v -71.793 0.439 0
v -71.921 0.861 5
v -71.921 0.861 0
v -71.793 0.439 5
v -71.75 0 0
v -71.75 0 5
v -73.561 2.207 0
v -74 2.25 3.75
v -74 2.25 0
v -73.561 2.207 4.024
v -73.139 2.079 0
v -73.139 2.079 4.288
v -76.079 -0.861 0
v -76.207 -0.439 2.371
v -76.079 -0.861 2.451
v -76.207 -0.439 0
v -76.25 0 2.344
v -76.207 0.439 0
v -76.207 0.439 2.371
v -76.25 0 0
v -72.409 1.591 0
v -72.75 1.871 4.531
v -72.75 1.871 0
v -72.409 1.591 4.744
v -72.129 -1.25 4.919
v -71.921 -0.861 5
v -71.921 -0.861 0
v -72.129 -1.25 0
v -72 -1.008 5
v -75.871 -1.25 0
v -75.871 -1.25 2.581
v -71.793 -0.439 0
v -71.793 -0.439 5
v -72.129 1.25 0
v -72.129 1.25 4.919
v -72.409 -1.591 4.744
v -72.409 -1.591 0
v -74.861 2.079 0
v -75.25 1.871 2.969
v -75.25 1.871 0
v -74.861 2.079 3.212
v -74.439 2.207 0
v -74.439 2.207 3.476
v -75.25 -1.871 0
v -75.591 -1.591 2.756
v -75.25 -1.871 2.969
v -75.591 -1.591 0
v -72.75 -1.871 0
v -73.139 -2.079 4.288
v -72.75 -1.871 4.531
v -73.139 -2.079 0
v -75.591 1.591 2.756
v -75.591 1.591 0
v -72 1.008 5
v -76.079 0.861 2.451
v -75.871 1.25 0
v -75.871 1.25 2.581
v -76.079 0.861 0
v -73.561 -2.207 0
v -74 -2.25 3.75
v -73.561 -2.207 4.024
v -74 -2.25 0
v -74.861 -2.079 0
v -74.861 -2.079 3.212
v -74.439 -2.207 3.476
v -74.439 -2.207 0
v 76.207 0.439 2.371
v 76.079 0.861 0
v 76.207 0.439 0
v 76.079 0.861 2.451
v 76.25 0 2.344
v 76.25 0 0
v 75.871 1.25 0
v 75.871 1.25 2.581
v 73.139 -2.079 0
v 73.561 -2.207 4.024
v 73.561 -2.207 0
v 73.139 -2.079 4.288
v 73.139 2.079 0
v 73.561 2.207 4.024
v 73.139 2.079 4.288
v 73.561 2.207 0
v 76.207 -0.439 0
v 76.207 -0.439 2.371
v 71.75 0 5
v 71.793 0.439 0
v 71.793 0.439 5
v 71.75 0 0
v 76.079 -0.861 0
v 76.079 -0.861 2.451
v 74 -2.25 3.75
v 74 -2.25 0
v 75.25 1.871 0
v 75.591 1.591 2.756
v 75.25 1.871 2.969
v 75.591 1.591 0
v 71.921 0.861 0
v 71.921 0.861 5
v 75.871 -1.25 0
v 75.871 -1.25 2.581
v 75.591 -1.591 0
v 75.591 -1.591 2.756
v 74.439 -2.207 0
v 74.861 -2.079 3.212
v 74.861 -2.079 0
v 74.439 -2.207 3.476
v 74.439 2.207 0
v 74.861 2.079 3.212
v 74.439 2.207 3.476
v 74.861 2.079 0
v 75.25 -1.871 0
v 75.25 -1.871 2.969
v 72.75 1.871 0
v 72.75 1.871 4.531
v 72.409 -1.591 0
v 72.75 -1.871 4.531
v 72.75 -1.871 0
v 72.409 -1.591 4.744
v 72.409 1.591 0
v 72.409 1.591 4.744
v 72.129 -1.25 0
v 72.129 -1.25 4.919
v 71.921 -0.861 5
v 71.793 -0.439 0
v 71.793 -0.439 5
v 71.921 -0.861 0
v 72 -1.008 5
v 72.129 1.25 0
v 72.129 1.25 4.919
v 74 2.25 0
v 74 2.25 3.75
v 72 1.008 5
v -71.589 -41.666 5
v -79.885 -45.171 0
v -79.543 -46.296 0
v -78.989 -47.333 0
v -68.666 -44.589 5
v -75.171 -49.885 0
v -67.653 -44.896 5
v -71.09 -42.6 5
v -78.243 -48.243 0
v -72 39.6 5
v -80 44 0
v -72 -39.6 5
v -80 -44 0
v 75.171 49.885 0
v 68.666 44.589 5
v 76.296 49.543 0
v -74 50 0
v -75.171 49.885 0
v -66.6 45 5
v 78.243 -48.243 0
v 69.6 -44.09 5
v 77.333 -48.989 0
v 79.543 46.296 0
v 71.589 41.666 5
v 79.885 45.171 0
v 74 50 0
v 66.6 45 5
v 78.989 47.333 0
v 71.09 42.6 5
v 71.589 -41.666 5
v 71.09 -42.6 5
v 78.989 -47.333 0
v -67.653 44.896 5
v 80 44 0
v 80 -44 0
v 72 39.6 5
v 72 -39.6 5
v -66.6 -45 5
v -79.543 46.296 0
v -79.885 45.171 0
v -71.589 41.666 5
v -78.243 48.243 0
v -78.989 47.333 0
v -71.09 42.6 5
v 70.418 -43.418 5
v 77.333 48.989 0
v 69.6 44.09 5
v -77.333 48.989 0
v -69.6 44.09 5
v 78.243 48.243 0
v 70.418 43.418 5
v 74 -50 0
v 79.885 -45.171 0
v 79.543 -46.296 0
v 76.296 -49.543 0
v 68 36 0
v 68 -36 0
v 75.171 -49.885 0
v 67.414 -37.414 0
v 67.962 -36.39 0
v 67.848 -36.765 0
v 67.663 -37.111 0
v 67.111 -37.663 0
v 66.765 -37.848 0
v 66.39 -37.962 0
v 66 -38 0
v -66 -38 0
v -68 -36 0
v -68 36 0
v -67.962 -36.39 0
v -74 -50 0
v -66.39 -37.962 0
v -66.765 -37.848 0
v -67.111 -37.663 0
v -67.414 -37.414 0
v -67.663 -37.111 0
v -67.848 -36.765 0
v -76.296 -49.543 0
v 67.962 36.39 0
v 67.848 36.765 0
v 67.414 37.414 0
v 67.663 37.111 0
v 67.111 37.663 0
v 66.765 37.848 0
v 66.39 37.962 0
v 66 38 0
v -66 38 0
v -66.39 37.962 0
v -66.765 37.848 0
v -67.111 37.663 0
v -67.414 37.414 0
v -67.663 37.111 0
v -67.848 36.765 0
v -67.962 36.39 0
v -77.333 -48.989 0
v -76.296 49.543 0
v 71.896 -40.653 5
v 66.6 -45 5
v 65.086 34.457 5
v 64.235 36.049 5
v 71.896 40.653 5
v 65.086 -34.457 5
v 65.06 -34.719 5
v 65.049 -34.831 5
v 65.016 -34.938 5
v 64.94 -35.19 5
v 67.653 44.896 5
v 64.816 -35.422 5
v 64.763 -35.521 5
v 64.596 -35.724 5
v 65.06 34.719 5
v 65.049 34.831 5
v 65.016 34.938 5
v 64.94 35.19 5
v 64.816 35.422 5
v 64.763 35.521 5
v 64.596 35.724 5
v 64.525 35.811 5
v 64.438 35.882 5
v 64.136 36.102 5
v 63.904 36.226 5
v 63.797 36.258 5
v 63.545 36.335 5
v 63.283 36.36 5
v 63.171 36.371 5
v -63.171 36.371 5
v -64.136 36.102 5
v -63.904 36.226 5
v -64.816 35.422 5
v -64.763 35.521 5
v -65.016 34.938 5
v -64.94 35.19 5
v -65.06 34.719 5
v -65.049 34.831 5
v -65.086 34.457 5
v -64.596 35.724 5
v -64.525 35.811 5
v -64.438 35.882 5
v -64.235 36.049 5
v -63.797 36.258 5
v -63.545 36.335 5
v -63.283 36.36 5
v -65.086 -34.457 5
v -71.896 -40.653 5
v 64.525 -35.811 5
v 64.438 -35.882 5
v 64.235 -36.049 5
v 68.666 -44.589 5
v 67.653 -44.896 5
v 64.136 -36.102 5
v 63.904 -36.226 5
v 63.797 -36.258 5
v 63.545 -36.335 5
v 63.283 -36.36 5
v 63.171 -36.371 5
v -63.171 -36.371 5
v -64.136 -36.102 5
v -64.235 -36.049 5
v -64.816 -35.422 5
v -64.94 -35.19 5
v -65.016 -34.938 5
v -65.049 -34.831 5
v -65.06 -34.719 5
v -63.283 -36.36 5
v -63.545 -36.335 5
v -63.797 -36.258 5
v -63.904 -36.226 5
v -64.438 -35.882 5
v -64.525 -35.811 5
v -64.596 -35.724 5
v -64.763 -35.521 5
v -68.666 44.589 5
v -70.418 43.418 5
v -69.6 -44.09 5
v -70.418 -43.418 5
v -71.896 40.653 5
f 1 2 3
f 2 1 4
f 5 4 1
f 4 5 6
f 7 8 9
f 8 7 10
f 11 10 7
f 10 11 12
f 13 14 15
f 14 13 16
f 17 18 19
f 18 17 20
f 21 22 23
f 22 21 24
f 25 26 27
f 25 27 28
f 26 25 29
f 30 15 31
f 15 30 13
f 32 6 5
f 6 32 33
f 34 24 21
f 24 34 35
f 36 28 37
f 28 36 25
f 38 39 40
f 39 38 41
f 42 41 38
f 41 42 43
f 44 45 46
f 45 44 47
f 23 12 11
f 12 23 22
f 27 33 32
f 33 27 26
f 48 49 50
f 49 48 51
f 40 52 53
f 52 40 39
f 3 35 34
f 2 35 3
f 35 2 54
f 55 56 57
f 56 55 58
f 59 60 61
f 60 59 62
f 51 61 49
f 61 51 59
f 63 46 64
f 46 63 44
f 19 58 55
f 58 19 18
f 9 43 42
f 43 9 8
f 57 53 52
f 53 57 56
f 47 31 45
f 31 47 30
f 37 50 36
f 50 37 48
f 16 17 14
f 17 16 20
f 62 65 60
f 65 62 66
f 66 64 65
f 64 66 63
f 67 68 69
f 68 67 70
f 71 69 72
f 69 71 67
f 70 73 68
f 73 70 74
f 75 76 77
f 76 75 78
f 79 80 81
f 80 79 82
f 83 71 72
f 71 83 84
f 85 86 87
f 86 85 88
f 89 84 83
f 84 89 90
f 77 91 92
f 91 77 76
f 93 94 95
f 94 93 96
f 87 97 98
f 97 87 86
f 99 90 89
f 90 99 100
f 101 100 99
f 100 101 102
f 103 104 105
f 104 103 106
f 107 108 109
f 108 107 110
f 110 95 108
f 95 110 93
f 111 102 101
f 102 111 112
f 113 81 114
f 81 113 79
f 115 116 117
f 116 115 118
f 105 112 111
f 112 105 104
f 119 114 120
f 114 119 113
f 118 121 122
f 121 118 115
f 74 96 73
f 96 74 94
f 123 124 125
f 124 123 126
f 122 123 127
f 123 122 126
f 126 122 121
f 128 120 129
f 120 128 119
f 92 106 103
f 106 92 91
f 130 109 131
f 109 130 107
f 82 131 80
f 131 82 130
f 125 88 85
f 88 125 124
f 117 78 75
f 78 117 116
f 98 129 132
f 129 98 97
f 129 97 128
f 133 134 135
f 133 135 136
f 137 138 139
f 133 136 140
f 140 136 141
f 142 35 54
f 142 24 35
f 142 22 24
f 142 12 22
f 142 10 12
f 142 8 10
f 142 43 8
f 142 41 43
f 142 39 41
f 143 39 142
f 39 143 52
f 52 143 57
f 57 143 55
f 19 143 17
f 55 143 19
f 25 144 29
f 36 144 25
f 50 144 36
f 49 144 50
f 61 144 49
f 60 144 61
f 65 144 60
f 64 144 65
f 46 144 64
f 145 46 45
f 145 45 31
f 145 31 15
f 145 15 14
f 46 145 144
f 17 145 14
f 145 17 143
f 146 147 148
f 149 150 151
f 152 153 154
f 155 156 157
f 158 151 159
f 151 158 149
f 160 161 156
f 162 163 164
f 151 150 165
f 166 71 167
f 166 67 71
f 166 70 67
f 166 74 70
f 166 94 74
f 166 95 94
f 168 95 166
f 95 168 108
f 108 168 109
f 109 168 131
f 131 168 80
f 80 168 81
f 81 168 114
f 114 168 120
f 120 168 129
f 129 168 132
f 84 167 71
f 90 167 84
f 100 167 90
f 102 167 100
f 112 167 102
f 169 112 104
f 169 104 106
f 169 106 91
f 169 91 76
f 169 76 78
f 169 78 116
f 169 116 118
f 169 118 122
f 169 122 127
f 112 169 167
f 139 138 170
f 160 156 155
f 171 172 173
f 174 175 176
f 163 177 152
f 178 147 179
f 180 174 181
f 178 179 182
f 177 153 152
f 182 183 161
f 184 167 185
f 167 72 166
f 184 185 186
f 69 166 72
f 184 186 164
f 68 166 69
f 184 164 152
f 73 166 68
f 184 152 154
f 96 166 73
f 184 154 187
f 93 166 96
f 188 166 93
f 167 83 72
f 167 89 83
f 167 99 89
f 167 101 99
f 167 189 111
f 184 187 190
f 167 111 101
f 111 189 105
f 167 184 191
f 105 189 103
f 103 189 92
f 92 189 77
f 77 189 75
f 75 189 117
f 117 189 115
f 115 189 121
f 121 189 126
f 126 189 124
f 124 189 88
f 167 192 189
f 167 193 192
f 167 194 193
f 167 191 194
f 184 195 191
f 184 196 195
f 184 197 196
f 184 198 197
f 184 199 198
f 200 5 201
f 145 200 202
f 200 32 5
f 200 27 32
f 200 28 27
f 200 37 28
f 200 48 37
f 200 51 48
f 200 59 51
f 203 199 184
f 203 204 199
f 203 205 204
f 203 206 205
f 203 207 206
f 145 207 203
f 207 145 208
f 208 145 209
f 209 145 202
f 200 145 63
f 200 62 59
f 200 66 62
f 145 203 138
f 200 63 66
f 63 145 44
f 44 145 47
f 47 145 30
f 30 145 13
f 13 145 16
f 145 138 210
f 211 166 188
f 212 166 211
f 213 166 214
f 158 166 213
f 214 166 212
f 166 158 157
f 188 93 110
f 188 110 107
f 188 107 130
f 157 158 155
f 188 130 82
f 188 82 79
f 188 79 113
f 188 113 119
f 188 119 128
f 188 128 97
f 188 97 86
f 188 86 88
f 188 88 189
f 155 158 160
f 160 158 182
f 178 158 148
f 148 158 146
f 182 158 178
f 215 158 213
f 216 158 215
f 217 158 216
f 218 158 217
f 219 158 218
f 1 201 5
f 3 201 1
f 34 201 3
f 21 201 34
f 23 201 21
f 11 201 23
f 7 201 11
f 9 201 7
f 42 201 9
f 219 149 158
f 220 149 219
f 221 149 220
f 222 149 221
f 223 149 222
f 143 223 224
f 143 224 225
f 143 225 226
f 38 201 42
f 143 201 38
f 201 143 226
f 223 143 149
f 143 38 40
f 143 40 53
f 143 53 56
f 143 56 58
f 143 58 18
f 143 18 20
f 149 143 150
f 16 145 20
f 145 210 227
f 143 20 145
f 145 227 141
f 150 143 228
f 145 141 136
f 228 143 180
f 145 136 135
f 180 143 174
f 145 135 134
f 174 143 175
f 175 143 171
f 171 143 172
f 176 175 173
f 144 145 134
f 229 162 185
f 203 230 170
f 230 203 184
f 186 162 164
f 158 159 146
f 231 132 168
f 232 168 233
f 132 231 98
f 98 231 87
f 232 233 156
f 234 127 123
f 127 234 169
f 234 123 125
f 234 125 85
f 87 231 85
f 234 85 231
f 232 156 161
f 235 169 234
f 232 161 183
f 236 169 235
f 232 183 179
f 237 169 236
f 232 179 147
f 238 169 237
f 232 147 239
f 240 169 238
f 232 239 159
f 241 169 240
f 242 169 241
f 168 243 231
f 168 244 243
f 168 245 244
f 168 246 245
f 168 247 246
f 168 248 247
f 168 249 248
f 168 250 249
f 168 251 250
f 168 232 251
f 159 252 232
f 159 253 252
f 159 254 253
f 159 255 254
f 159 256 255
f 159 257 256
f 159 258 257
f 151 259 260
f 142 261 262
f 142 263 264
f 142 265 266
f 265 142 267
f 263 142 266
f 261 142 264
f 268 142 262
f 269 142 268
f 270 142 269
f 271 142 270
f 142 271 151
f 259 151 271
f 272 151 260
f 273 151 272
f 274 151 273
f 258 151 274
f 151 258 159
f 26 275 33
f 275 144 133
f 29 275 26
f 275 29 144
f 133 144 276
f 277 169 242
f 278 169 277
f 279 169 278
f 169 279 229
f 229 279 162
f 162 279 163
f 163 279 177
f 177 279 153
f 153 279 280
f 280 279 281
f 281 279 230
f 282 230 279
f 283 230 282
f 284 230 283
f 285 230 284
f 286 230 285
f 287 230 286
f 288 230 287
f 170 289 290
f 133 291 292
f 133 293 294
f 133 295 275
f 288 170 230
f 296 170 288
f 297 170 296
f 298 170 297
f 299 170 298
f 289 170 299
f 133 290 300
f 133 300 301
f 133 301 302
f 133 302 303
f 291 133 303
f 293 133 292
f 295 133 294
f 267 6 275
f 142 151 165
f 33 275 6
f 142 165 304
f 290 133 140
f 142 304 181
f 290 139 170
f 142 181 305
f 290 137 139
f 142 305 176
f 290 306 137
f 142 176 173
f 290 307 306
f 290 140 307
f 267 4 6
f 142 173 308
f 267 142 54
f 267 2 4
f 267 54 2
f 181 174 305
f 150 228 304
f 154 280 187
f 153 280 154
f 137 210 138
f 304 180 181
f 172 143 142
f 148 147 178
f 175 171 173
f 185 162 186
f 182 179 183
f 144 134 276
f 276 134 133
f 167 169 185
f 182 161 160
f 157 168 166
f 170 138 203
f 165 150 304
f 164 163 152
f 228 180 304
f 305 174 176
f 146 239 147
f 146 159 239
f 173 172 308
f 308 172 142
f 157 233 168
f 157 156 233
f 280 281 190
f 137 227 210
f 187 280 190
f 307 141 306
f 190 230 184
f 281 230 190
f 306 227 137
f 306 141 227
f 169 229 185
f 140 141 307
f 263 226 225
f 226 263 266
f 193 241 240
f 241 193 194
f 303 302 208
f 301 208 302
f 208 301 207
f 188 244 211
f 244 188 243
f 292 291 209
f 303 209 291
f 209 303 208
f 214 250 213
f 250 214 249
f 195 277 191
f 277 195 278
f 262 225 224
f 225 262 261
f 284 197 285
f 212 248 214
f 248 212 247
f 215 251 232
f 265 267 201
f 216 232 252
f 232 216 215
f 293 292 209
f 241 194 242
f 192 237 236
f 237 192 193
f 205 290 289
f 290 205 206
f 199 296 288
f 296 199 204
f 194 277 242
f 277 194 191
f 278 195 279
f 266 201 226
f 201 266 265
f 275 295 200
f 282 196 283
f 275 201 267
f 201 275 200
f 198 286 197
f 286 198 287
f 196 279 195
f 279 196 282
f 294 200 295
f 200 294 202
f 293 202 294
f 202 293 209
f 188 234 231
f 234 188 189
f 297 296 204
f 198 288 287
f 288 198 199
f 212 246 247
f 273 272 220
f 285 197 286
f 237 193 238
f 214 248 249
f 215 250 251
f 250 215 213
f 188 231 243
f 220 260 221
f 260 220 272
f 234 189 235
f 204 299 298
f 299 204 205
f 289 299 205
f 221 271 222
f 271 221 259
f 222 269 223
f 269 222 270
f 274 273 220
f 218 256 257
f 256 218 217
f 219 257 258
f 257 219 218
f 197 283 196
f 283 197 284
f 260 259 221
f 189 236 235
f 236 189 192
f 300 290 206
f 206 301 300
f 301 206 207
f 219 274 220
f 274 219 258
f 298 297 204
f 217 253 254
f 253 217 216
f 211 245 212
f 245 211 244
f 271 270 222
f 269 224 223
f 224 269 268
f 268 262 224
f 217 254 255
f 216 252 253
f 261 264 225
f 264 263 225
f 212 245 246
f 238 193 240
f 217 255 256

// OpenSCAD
$fn = 32;

// ----------------------------------------------------------------------
// Display bezel: 160 x 100 mm frame, opening 136x76 mm
// ----------------------------------------------------------------------

// --- parameters (mm) ---
length = 160;             // frame outside length, X
width = 100;              // frame outside width, Y
frame_w = 12;             // frame width
thickness = 5;            // frame thickness
corner_r = 6;             // outside corner radius
chamfer = 0.9;            // outer wall taper
funnel = 0.94;            // inner opening taper
opening_l = 136;          // opening length
opening_w = 76;           // opening width
inner_r = 2;              // opening corner radius
hole_d = 4.5;             // mounting screw clearance
holes_per_side = 1;       // holes per short side
hole_inset = 6;           // hole centre inset from the outside edge

/* rounded-rectangle outlines, generated with loops */
module rounded_ring(l_nom, w_nom, r) {
  hull() {
    for (sx = [-1, 1]) for (sy = [-1, 1])
      translate([sx * (l_nom / 2 - r), sy * (w_nom / 2 - r)]) circle(r = r);
  }
}

difference() {
  /* frame body, drafted so the outer edge is a variable-depth chamfer */
  linear_extrude(height = thickness, scale = chamfer)
    rounded_ring(length, width, corner_r);
  /* viewing opening, drafted the other way for a funnel edge */
  linear_extrude(height = thickness + 2, scale = funnel)
    translate([0, 0, -1]) rounded_ring(opening_l, opening_w, inner_r);
  /* mounting screws through the frame lands */
  for (sx = [-1, 1]) for (i = [1 : holes_per_side])
    translate([sx * (length / 2 - hole_inset),
               (i - (holes_per_side + 1) / 2) * width * 0.5, -1])
      cylinder(h = thickness + 2, d = hole_d);
}
